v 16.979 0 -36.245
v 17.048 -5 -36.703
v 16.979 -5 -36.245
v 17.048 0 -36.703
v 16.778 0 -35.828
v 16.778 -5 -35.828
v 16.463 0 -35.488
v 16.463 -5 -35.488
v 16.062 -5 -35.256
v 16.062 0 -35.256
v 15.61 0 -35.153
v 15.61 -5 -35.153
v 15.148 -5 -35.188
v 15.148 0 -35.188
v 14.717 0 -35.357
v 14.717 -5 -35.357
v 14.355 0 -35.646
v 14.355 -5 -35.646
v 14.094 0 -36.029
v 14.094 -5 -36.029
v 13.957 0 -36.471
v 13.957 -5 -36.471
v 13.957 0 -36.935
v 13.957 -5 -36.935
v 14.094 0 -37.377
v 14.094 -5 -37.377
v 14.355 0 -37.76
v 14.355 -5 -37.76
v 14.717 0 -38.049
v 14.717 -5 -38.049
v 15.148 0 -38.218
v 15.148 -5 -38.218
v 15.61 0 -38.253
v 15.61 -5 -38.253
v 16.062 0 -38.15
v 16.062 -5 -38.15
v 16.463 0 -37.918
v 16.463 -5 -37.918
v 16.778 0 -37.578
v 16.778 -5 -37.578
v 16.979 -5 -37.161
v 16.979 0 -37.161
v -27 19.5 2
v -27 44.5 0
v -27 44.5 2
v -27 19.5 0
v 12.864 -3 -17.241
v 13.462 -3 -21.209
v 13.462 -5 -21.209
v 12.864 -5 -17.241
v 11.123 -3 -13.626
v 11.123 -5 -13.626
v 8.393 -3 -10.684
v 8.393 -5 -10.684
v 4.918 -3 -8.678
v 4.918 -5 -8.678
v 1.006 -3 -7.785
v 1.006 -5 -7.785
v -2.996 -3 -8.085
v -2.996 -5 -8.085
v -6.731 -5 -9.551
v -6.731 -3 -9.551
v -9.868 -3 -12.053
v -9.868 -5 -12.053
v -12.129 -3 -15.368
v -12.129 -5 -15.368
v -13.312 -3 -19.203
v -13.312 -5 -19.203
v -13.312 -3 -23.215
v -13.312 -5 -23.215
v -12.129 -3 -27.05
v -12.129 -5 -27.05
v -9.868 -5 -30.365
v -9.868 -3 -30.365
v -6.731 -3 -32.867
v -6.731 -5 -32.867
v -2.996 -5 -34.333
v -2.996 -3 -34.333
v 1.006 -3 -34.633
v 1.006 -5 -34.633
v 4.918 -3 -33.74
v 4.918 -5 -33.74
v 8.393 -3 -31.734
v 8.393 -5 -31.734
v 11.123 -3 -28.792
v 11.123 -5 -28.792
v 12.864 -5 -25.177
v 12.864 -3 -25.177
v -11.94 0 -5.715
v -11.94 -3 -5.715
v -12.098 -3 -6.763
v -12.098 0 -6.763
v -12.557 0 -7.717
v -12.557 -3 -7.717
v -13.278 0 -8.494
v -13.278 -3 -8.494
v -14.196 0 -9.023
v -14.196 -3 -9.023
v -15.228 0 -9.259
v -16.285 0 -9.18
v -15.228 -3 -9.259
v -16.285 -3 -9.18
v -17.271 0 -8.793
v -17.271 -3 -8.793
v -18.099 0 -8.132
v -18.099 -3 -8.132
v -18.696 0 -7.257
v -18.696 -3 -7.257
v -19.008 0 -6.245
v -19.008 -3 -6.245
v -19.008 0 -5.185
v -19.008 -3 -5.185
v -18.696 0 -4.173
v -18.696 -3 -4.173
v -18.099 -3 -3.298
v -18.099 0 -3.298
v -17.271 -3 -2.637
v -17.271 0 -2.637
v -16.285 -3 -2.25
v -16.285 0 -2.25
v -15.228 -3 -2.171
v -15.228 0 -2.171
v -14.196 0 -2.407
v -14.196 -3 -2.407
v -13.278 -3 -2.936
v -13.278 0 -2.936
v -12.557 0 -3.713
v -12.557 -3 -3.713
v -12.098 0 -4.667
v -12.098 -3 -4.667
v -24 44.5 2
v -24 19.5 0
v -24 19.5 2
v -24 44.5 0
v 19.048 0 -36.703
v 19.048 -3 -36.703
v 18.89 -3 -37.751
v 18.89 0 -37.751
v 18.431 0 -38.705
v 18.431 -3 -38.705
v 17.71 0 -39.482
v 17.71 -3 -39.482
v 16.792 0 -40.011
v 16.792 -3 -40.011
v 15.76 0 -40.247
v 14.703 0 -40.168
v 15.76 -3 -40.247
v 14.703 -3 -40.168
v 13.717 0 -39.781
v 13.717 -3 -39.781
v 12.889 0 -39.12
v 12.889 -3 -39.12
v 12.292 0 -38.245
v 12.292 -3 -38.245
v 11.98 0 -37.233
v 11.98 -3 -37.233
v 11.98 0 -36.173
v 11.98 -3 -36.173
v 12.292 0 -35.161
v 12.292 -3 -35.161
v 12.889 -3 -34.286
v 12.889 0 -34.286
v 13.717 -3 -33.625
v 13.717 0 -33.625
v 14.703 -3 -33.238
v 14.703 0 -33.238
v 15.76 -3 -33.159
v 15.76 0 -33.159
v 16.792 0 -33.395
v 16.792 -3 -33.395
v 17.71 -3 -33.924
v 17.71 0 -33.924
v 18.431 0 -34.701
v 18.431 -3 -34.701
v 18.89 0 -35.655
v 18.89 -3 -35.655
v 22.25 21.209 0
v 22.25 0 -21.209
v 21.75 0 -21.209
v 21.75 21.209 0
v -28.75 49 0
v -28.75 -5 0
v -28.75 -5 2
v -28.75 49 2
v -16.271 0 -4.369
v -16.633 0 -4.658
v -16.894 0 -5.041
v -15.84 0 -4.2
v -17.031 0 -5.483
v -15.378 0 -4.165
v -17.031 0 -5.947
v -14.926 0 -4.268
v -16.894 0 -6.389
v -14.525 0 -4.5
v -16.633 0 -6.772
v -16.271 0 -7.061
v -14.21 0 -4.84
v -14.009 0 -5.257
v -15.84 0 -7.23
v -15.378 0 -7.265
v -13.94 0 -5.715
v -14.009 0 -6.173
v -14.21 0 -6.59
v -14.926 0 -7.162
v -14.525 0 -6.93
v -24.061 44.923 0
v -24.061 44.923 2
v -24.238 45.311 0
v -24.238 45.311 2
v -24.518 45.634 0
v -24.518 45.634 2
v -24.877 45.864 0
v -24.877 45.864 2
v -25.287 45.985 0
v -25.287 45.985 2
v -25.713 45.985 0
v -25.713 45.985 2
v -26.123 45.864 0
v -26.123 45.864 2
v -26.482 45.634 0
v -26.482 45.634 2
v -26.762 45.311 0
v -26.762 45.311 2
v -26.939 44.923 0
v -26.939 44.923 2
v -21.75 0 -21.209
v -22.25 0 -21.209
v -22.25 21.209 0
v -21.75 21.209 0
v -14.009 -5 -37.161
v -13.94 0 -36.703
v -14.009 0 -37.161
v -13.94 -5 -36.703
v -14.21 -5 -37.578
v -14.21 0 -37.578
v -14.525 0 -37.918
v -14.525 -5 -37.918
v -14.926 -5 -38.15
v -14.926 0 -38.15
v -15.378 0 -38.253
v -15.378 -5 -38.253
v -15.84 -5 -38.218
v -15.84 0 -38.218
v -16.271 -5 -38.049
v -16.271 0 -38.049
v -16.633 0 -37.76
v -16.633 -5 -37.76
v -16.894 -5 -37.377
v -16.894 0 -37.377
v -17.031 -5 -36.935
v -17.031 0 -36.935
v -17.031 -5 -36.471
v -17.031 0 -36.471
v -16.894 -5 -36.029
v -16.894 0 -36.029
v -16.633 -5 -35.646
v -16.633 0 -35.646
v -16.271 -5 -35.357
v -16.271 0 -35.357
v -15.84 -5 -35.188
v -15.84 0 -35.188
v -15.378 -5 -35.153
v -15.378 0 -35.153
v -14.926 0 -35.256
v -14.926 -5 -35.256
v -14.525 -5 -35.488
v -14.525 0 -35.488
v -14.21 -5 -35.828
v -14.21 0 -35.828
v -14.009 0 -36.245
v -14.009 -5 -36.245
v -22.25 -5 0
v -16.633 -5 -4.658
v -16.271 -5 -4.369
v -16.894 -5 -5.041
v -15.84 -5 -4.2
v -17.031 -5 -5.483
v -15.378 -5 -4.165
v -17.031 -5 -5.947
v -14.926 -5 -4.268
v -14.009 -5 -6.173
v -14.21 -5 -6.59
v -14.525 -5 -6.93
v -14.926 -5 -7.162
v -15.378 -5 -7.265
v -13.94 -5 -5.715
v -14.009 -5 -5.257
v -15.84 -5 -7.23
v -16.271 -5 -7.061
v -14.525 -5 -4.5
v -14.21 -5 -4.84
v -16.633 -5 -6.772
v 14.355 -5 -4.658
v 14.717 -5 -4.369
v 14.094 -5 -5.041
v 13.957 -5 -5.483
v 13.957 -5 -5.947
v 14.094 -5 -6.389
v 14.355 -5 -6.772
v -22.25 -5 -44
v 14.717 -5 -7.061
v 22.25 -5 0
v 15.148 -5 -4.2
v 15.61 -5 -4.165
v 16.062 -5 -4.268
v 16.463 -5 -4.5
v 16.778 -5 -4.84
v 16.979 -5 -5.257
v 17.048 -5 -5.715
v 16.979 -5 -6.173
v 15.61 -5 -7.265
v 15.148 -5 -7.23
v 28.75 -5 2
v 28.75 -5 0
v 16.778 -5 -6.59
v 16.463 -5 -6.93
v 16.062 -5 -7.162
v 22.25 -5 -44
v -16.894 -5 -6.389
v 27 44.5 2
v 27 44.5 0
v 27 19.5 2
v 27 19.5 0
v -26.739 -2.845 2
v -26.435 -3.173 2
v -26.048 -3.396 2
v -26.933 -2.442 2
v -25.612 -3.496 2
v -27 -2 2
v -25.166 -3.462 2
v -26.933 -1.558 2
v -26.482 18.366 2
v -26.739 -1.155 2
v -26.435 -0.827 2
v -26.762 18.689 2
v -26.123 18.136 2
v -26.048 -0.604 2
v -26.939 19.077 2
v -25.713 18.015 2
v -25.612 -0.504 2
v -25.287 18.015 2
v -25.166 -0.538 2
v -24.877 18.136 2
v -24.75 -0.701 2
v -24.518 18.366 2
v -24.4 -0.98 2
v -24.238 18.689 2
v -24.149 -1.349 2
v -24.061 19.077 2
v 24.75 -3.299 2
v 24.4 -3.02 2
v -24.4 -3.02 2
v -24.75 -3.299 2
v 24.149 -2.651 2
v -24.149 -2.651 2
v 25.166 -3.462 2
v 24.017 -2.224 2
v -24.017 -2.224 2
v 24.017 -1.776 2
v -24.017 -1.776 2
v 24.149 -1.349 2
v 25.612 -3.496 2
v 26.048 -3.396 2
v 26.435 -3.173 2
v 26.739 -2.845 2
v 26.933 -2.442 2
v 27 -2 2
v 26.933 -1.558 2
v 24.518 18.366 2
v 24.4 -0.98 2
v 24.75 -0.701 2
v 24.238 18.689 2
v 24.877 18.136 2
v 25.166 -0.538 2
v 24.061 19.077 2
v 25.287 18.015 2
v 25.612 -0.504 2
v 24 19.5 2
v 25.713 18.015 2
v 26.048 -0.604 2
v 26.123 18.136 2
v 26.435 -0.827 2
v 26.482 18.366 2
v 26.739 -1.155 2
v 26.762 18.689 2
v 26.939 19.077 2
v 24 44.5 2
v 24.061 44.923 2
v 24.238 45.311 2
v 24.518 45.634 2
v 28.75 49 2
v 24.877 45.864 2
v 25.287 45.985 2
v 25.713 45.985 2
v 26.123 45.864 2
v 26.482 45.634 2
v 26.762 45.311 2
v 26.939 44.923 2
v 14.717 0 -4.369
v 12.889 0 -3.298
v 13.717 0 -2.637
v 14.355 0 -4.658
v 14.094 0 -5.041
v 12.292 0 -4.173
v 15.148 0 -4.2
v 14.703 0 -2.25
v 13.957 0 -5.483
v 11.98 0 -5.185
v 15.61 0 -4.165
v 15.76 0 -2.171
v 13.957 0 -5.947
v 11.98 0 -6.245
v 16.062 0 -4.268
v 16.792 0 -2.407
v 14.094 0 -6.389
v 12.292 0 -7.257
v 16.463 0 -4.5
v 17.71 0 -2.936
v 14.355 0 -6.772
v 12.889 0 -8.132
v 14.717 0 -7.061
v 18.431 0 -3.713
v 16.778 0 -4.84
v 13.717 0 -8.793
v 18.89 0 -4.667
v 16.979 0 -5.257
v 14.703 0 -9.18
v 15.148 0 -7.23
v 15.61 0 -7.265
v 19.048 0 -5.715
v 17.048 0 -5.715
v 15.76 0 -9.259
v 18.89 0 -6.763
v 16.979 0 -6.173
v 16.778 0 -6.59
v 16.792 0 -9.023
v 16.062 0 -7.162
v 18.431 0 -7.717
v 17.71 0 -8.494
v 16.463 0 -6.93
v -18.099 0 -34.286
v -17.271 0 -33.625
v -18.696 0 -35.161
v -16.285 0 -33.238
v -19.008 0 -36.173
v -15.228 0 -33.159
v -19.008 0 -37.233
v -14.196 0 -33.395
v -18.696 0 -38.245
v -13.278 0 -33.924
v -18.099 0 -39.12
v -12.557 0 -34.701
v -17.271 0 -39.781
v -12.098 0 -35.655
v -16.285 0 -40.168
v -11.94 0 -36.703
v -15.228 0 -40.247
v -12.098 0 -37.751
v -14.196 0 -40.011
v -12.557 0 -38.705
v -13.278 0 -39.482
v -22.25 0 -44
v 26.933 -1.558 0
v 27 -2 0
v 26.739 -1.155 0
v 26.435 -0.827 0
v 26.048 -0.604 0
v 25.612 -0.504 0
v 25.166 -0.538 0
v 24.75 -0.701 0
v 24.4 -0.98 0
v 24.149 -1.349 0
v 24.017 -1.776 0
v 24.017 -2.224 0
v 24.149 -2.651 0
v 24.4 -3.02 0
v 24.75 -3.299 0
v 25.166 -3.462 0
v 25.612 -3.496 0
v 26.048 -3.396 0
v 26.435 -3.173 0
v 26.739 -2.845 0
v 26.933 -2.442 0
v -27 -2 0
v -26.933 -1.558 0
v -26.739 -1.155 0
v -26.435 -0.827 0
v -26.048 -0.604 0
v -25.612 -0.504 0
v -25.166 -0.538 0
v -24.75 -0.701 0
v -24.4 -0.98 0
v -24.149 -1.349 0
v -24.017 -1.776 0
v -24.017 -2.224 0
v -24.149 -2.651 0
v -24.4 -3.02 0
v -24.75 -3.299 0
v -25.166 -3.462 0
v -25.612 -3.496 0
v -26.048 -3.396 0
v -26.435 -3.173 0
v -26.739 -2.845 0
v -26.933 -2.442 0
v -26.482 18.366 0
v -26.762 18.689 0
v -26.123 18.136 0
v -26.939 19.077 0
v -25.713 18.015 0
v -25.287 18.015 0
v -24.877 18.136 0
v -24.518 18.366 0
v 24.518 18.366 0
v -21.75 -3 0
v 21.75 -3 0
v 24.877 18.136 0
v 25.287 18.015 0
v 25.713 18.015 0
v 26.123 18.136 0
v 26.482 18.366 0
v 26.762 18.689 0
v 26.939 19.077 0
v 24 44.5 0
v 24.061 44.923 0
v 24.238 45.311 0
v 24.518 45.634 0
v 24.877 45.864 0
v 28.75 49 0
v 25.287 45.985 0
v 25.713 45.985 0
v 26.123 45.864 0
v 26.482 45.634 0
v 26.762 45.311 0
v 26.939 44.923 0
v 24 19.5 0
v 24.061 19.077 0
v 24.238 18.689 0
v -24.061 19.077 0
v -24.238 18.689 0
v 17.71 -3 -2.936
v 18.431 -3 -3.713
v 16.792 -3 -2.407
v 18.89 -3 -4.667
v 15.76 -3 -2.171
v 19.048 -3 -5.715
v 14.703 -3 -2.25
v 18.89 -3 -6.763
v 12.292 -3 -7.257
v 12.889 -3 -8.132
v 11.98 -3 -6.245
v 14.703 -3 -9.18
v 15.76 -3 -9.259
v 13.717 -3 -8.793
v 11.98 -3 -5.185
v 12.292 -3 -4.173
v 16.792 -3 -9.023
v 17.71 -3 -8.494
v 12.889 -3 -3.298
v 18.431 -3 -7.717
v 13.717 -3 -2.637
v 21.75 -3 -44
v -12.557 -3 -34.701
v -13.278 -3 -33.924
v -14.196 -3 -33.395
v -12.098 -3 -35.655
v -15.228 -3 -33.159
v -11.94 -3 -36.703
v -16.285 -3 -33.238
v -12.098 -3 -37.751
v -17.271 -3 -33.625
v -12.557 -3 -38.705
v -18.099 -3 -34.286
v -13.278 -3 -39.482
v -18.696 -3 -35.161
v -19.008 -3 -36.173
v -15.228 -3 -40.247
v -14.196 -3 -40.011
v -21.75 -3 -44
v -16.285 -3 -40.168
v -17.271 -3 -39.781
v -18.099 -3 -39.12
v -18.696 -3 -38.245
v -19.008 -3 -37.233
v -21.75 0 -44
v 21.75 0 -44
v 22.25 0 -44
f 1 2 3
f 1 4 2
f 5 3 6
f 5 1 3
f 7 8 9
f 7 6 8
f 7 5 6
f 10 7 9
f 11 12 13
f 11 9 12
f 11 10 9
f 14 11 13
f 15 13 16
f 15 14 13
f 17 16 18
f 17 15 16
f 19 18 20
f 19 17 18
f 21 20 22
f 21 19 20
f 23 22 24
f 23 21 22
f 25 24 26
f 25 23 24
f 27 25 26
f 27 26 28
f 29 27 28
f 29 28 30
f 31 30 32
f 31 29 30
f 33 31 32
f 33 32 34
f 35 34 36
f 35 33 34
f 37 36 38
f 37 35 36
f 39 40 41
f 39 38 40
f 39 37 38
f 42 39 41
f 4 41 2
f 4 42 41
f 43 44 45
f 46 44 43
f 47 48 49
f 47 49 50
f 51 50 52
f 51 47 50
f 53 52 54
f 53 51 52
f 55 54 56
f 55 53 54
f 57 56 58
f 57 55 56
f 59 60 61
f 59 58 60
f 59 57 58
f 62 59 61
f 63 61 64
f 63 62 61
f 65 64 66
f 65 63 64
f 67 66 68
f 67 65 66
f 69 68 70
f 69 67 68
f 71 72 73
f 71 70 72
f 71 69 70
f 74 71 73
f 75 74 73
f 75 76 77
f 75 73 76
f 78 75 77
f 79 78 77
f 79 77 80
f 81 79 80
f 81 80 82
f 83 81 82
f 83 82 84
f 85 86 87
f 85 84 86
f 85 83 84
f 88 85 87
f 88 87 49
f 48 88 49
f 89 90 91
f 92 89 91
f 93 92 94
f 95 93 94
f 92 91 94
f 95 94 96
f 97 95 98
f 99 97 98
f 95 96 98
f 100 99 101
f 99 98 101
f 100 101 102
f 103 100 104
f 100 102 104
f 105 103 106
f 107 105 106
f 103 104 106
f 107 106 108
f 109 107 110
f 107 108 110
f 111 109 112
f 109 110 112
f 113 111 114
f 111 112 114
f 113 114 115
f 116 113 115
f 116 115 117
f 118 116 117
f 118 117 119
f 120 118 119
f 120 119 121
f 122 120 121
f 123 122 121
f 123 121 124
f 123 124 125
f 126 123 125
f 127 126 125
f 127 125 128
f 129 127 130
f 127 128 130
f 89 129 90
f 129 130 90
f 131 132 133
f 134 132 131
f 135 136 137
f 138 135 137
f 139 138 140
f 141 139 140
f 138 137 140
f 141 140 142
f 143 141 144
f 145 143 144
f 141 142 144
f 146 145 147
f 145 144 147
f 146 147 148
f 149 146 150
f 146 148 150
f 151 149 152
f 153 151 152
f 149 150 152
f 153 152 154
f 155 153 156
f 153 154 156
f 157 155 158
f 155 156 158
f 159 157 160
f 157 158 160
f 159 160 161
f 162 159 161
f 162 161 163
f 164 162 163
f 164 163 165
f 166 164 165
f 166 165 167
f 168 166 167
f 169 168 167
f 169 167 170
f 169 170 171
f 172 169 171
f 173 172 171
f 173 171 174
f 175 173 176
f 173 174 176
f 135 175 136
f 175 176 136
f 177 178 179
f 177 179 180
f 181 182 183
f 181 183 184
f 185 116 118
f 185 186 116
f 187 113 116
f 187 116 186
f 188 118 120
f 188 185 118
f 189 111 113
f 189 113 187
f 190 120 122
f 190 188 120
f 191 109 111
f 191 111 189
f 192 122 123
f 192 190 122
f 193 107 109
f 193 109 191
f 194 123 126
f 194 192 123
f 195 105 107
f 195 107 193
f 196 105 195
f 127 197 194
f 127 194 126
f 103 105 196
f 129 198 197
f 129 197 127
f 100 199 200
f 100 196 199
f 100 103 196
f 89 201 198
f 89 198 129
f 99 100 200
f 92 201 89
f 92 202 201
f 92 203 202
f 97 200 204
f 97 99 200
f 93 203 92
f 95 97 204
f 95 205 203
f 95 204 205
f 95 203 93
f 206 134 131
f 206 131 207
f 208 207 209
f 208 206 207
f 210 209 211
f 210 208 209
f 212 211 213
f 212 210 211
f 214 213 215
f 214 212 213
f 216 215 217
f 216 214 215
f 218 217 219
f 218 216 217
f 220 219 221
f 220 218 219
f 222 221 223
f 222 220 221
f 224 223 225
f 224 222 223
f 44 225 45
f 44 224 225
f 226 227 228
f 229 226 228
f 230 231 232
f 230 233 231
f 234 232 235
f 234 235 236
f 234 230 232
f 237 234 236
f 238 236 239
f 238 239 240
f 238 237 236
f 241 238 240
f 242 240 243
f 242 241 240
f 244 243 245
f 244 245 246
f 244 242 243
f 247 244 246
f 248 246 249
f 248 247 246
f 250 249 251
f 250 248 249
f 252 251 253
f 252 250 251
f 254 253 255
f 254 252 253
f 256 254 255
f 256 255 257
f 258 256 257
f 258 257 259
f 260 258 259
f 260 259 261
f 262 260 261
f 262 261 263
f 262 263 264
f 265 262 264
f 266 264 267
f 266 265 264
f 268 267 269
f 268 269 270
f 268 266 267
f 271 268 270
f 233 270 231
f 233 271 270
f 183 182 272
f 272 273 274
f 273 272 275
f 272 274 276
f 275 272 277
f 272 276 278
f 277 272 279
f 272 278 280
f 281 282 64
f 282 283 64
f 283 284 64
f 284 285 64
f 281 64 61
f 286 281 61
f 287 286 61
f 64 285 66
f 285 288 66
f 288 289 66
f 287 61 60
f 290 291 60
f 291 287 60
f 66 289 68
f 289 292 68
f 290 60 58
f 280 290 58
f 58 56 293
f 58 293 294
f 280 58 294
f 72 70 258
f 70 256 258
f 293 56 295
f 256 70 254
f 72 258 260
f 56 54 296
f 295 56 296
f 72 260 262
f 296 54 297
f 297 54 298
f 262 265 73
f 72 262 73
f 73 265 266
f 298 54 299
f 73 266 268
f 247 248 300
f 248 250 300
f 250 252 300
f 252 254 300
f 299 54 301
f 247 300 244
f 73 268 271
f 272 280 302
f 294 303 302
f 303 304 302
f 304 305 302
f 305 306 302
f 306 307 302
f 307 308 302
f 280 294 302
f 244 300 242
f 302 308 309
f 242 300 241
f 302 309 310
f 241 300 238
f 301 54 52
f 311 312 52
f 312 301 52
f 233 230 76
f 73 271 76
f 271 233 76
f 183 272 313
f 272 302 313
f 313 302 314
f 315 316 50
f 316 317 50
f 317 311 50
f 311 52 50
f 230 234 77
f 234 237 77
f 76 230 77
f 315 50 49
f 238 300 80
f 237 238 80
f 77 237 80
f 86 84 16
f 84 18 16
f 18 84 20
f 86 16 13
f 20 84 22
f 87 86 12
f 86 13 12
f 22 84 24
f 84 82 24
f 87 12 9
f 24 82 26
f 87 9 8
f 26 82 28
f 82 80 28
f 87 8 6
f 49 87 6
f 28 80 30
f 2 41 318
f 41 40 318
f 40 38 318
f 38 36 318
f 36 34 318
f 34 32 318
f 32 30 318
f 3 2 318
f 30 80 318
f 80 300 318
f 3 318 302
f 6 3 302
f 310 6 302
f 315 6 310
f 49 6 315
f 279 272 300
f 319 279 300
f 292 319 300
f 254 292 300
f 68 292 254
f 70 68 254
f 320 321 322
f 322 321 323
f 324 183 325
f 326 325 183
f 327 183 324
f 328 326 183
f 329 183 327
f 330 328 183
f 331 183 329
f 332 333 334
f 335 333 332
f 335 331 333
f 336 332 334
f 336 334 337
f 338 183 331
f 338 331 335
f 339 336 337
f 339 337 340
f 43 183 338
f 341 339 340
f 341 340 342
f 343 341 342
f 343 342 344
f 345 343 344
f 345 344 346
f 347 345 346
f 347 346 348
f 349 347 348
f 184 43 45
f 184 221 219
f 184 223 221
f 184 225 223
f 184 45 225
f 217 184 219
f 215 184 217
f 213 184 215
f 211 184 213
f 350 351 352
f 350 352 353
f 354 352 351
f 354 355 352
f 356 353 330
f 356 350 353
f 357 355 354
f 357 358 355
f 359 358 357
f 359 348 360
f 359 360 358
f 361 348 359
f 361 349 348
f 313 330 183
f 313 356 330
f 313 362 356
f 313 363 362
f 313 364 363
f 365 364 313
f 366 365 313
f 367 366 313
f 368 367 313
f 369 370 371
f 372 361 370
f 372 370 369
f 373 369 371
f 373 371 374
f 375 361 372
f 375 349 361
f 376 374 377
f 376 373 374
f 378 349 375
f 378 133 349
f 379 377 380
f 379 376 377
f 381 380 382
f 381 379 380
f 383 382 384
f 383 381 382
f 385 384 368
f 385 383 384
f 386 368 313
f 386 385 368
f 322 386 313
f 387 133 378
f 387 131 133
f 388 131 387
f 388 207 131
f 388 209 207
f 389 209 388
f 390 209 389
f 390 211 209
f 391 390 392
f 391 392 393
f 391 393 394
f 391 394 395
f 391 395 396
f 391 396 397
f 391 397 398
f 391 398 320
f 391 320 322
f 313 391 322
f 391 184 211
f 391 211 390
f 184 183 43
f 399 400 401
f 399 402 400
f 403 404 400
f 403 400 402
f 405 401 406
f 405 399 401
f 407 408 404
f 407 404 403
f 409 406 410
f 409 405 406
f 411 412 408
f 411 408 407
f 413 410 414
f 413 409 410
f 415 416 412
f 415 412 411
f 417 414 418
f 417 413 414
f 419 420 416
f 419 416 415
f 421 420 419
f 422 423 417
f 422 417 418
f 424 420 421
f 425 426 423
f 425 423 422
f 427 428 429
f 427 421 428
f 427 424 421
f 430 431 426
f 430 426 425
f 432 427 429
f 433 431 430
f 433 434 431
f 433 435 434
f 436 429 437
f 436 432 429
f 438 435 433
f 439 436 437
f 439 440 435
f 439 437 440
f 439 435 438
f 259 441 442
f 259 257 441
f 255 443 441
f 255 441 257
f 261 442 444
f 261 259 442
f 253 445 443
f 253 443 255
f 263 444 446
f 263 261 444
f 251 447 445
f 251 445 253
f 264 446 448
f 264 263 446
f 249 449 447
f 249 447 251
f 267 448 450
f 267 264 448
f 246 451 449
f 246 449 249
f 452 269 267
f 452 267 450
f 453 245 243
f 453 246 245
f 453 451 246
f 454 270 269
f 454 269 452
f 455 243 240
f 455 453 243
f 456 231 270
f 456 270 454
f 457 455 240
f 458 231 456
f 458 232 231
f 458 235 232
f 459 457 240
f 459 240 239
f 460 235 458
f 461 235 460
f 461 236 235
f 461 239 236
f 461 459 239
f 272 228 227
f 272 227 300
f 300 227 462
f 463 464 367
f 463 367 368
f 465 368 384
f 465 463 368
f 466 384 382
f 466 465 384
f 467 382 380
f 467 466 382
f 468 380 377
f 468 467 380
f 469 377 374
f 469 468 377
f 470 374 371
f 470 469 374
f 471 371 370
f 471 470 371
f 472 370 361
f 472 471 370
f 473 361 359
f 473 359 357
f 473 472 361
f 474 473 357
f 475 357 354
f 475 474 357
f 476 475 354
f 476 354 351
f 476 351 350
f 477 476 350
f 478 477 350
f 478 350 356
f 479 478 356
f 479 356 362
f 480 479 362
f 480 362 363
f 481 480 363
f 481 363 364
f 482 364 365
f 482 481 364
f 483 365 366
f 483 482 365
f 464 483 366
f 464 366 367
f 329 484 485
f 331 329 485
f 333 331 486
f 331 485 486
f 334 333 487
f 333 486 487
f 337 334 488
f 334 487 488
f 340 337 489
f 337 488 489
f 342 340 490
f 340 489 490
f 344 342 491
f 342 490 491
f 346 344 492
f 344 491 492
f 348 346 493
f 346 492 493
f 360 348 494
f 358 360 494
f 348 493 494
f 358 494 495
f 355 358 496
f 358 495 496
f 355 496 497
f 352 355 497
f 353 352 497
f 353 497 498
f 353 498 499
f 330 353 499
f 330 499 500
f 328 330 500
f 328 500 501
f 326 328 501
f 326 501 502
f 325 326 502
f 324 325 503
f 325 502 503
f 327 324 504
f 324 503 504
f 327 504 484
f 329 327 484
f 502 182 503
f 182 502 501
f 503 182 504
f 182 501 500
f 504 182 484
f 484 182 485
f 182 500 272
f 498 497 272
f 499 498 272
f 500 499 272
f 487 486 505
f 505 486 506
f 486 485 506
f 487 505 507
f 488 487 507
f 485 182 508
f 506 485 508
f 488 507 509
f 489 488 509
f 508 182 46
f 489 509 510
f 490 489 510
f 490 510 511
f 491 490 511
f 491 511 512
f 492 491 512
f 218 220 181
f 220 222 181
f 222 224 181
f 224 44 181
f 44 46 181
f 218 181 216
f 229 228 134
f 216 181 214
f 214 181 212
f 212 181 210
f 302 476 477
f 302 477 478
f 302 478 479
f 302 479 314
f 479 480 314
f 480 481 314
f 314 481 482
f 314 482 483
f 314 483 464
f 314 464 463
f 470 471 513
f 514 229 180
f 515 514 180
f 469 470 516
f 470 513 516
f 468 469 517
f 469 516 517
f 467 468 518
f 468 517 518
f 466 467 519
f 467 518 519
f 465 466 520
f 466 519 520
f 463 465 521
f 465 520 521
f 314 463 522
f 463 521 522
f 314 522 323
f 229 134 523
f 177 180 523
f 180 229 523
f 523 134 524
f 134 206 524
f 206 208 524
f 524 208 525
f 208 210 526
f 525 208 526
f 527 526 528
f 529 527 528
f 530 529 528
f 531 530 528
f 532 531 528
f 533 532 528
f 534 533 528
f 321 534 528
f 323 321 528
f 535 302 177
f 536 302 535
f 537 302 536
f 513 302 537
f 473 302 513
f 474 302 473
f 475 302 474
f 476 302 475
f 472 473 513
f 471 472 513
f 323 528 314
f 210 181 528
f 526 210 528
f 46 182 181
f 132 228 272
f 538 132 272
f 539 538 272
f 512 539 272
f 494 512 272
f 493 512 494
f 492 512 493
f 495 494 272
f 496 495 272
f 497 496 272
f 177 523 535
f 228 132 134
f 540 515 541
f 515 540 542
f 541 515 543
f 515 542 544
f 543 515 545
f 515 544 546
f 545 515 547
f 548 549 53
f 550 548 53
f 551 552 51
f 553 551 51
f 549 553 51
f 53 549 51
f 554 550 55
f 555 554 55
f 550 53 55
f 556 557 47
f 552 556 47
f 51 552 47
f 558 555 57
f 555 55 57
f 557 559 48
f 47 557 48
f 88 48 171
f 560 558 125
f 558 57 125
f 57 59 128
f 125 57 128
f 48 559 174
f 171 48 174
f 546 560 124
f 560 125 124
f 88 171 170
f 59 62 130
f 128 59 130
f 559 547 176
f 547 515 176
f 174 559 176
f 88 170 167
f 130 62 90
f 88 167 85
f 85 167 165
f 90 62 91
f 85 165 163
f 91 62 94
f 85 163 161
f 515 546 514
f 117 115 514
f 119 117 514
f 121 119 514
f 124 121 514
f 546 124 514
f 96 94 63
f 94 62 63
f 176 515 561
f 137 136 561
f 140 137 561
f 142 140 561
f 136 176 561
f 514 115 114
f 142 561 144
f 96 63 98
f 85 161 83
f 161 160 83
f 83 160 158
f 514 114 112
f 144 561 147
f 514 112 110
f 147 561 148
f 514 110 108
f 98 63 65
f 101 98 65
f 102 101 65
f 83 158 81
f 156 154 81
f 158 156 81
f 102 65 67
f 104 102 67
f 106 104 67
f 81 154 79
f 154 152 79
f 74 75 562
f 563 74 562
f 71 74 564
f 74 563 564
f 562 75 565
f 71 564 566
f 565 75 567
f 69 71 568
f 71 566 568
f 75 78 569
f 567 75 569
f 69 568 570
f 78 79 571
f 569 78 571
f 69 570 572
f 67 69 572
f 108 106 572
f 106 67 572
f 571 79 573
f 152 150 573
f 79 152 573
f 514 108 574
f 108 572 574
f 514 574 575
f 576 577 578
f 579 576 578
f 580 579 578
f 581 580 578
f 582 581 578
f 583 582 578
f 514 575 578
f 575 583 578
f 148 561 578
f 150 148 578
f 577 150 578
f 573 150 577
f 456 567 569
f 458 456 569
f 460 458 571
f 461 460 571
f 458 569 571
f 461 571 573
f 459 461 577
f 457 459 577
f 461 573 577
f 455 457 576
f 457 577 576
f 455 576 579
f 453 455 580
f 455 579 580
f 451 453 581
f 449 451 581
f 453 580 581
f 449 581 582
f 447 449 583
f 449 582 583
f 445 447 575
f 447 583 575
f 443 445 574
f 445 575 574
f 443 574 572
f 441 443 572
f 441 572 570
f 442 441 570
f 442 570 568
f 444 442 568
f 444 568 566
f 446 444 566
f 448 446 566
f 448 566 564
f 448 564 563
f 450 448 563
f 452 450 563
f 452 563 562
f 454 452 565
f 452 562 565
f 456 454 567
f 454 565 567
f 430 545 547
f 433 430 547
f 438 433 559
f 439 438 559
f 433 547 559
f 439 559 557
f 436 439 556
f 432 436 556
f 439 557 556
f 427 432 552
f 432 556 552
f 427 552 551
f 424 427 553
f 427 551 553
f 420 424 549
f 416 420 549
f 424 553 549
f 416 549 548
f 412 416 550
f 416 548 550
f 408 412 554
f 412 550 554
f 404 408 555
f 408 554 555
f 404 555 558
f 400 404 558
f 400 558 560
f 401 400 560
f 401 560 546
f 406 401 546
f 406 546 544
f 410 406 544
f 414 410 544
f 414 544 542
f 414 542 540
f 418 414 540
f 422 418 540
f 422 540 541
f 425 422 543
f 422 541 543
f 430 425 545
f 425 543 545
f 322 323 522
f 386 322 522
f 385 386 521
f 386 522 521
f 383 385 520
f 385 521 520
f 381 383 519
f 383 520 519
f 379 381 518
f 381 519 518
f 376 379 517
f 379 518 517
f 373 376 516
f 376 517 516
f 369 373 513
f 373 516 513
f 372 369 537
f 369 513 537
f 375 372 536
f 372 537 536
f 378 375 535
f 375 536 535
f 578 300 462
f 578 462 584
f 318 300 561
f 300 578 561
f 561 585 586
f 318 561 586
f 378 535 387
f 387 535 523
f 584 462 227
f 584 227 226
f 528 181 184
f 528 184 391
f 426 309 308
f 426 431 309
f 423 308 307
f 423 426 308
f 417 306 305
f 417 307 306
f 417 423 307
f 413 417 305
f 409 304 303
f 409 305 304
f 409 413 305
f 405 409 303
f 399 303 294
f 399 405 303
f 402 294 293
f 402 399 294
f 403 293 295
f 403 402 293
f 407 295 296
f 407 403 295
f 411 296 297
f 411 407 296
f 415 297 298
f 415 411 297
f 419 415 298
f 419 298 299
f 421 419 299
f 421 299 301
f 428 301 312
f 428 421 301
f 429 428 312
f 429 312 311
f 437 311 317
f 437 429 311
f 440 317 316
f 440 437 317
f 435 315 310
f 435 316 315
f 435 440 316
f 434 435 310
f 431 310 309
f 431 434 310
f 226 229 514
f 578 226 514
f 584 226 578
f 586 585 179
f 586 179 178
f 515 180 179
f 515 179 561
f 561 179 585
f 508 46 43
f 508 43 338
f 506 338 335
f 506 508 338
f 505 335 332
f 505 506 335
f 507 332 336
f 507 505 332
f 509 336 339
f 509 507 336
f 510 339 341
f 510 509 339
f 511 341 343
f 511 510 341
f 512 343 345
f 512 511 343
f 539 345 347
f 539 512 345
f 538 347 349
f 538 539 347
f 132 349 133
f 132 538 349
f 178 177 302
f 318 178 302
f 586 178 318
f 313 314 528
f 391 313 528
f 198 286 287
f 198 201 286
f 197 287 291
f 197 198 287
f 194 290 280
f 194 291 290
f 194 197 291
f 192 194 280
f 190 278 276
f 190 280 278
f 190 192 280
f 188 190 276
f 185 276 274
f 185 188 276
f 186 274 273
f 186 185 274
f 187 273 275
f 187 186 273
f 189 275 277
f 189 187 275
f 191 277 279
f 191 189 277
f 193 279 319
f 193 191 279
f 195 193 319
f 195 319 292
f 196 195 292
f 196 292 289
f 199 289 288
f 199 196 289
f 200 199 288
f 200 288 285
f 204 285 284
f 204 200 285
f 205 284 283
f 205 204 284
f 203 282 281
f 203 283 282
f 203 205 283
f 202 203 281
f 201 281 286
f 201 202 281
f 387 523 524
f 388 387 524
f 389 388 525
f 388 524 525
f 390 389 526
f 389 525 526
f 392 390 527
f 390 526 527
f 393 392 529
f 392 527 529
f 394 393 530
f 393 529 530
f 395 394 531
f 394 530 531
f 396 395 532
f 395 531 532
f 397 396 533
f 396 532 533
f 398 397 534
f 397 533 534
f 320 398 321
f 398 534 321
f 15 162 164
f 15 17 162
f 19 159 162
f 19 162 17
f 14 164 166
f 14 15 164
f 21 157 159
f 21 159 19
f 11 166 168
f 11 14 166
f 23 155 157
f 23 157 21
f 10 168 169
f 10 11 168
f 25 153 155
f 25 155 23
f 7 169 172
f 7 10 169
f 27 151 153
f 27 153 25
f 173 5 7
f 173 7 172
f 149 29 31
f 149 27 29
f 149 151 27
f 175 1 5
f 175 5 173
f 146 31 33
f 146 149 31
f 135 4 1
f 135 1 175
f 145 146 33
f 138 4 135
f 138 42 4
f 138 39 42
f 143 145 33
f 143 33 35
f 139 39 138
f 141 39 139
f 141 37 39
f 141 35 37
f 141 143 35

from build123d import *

# Parameters (mm, degrees)
SKETCH3_W                = 44.5
SKETCH3_H                = 44
SKETCH3_R                = 13.462
SKETCH3_R_2              = 1.554126588
FRONT_FACE_DEPTH         = 5
SKETCH4_W                = 44.5
SKETCH4_H                = 54
BOTTOM_PLATE_DEPTH       = 2
RIB_DEPTH                = 0.5
SKETCH6_W                = 6.5
SKETCH6_H                = 54
SKETCH6_R                = 1.5
BOTTOM_SCREW_HOLES_DEPTH = 2
SKETCH7_W                = 43.5
SKETCH7_H                = 3
CUT_EXTRUDE1_DEPTH       = 44
SKETCH8_R                = 3.554126588
SKETCH8_R_2              = 1.554126588
BOSS_EXTRUDE5_DEPTH      = 3


with BuildPart() as part:
    # Sketch3 → Front Face (new body)
    with BuildSketch(Plane.XZ):
        with Locations((0, -22)):
            Rectangle(SKETCH3_W, SKETCH3_H)
        with Locations((0, -21.209)):
            Circle(SKETCH3_R, mode=Mode.SUBTRACT)
        with Locations((15.494, -5.715)):
            Circle(SKETCH3_R_2, mode=Mode.SUBTRACT)
        with Locations((-15.494, -5.715)):
            Circle(SKETCH3_R_2, mode=Mode.SUBTRACT)
        with Locations((-15.494, -36.703)):
            Circle(SKETCH3_R_2, mode=Mode.SUBTRACT)
        with Locations((15.494, -36.703)):
            Circle(SKETCH3_R_2, mode=Mode.SUBTRACT)
    front_face = extrude(amount=FRONT_FACE_DEPTH)

    # Sketch4 → Bottom Plate (add)
    with BuildSketch(Plane.XY):
        with Locations((0, 22)):
            Rectangle(SKETCH4_W, SKETCH4_H)
    bottom_plate = extrude(amount=BOTTOM_PLATE_DEPTH)

    # Sketch5 → Rib (add)
    with BuildSketch(Plane.ZY.offset(22.25)):
        Polygon((-21.209, 0), (0, 21.209), (0, 0), align=None)
    rib = extrude(amount=-RIB_DEPTH)

    # Sketch6 → Bottom Screw Holes (add)
    with BuildSketch(Plane(origin=(21.209, 47.45, 0), x_dir=(-1, 0, 0), z_dir=(0, 0, -1))):
        with Locations((46.709, -25.45)):
            Rectangle(SKETCH6_W, SKETCH6_H)
        with Locations((46.709, -49.45)):
            Circle(SKETCH6_R, mode=Mode.SUBTRACT)
        with BuildLine():
            Line((48.209, -2.95), (48.209, -27.95))
            ThreePointArc((48.209, -27.95), (46.709, -29.45), (45.209, -27.95))
            Line((45.209, -27.95), (45.209, -2.95))
            ThreePointArc((45.209, -2.95), (46.709, -1.45), (48.209, -2.95))
        make_face(mode=Mode.SUBTRACT)
    bottom_screw_holes = extrude(amount=-BOTTOM_SCREW_HOLES_DEPTH)

    # Mirror of Rib and Bottom Screws: Front Face, Bottom Plate, Rib, Bottom Screw Holes across plane
    add(front_face.mirror(Plane.ZY))
    add(bottom_plate.mirror(Plane.ZY))
    add(rib.mirror(Plane.ZY))
    add(bottom_screw_holes.mirror(Plane.ZY))

    # Sketch7 → Cut-Extrude1 (cut)
    with BuildSketch(Plane(origin=(0, 0, -44), x_dir=(-1, 0, 0), z_dir=(0, 0, -1))):
        with Locations((0, -1.5)):
            Rectangle(SKETCH7_W, SKETCH7_H)
    extrude(amount=-CUT_EXTRUDE1_DEPTH, mode=Mode.SUBTRACT)

    # Sketch8 → Boss-Extrude5 (add)
    with BuildSketch(Plane(origin=(0, -3, 0), x_dir=(1, 0, 0), z_dir=(0, 1, 0))):
        with Locations((-15.494, 36.703)):
            Circle(SKETCH8_R)
        with Locations((-15.494, 36.703)):
            Circle(SKETCH8_R_2, mode=Mode.SUBTRACT)
        with Locations((15.494, 36.703)):
            Circle(SKETCH8_R)
        with Locations((15.494, 36.703)):
            Circle(SKETCH8_R_2, mode=Mode.SUBTRACT)
        with Locations((15.494, 5.715)):
            Circle(SKETCH8_R)
        with Locations((15.494, 5.715)):
            Circle(SKETCH8_R_2, mode=Mode.SUBTRACT)
        with Locations((-15.494, 5.715)):
            Circle(SKETCH8_R)
        with Locations((-15.494, 5.715)):
            Circle(SKETCH8_R_2, mode=Mode.SUBTRACT)
    extrude(amount=BOSS_EXTRUDE5_DEPTH)


solid = part.part
